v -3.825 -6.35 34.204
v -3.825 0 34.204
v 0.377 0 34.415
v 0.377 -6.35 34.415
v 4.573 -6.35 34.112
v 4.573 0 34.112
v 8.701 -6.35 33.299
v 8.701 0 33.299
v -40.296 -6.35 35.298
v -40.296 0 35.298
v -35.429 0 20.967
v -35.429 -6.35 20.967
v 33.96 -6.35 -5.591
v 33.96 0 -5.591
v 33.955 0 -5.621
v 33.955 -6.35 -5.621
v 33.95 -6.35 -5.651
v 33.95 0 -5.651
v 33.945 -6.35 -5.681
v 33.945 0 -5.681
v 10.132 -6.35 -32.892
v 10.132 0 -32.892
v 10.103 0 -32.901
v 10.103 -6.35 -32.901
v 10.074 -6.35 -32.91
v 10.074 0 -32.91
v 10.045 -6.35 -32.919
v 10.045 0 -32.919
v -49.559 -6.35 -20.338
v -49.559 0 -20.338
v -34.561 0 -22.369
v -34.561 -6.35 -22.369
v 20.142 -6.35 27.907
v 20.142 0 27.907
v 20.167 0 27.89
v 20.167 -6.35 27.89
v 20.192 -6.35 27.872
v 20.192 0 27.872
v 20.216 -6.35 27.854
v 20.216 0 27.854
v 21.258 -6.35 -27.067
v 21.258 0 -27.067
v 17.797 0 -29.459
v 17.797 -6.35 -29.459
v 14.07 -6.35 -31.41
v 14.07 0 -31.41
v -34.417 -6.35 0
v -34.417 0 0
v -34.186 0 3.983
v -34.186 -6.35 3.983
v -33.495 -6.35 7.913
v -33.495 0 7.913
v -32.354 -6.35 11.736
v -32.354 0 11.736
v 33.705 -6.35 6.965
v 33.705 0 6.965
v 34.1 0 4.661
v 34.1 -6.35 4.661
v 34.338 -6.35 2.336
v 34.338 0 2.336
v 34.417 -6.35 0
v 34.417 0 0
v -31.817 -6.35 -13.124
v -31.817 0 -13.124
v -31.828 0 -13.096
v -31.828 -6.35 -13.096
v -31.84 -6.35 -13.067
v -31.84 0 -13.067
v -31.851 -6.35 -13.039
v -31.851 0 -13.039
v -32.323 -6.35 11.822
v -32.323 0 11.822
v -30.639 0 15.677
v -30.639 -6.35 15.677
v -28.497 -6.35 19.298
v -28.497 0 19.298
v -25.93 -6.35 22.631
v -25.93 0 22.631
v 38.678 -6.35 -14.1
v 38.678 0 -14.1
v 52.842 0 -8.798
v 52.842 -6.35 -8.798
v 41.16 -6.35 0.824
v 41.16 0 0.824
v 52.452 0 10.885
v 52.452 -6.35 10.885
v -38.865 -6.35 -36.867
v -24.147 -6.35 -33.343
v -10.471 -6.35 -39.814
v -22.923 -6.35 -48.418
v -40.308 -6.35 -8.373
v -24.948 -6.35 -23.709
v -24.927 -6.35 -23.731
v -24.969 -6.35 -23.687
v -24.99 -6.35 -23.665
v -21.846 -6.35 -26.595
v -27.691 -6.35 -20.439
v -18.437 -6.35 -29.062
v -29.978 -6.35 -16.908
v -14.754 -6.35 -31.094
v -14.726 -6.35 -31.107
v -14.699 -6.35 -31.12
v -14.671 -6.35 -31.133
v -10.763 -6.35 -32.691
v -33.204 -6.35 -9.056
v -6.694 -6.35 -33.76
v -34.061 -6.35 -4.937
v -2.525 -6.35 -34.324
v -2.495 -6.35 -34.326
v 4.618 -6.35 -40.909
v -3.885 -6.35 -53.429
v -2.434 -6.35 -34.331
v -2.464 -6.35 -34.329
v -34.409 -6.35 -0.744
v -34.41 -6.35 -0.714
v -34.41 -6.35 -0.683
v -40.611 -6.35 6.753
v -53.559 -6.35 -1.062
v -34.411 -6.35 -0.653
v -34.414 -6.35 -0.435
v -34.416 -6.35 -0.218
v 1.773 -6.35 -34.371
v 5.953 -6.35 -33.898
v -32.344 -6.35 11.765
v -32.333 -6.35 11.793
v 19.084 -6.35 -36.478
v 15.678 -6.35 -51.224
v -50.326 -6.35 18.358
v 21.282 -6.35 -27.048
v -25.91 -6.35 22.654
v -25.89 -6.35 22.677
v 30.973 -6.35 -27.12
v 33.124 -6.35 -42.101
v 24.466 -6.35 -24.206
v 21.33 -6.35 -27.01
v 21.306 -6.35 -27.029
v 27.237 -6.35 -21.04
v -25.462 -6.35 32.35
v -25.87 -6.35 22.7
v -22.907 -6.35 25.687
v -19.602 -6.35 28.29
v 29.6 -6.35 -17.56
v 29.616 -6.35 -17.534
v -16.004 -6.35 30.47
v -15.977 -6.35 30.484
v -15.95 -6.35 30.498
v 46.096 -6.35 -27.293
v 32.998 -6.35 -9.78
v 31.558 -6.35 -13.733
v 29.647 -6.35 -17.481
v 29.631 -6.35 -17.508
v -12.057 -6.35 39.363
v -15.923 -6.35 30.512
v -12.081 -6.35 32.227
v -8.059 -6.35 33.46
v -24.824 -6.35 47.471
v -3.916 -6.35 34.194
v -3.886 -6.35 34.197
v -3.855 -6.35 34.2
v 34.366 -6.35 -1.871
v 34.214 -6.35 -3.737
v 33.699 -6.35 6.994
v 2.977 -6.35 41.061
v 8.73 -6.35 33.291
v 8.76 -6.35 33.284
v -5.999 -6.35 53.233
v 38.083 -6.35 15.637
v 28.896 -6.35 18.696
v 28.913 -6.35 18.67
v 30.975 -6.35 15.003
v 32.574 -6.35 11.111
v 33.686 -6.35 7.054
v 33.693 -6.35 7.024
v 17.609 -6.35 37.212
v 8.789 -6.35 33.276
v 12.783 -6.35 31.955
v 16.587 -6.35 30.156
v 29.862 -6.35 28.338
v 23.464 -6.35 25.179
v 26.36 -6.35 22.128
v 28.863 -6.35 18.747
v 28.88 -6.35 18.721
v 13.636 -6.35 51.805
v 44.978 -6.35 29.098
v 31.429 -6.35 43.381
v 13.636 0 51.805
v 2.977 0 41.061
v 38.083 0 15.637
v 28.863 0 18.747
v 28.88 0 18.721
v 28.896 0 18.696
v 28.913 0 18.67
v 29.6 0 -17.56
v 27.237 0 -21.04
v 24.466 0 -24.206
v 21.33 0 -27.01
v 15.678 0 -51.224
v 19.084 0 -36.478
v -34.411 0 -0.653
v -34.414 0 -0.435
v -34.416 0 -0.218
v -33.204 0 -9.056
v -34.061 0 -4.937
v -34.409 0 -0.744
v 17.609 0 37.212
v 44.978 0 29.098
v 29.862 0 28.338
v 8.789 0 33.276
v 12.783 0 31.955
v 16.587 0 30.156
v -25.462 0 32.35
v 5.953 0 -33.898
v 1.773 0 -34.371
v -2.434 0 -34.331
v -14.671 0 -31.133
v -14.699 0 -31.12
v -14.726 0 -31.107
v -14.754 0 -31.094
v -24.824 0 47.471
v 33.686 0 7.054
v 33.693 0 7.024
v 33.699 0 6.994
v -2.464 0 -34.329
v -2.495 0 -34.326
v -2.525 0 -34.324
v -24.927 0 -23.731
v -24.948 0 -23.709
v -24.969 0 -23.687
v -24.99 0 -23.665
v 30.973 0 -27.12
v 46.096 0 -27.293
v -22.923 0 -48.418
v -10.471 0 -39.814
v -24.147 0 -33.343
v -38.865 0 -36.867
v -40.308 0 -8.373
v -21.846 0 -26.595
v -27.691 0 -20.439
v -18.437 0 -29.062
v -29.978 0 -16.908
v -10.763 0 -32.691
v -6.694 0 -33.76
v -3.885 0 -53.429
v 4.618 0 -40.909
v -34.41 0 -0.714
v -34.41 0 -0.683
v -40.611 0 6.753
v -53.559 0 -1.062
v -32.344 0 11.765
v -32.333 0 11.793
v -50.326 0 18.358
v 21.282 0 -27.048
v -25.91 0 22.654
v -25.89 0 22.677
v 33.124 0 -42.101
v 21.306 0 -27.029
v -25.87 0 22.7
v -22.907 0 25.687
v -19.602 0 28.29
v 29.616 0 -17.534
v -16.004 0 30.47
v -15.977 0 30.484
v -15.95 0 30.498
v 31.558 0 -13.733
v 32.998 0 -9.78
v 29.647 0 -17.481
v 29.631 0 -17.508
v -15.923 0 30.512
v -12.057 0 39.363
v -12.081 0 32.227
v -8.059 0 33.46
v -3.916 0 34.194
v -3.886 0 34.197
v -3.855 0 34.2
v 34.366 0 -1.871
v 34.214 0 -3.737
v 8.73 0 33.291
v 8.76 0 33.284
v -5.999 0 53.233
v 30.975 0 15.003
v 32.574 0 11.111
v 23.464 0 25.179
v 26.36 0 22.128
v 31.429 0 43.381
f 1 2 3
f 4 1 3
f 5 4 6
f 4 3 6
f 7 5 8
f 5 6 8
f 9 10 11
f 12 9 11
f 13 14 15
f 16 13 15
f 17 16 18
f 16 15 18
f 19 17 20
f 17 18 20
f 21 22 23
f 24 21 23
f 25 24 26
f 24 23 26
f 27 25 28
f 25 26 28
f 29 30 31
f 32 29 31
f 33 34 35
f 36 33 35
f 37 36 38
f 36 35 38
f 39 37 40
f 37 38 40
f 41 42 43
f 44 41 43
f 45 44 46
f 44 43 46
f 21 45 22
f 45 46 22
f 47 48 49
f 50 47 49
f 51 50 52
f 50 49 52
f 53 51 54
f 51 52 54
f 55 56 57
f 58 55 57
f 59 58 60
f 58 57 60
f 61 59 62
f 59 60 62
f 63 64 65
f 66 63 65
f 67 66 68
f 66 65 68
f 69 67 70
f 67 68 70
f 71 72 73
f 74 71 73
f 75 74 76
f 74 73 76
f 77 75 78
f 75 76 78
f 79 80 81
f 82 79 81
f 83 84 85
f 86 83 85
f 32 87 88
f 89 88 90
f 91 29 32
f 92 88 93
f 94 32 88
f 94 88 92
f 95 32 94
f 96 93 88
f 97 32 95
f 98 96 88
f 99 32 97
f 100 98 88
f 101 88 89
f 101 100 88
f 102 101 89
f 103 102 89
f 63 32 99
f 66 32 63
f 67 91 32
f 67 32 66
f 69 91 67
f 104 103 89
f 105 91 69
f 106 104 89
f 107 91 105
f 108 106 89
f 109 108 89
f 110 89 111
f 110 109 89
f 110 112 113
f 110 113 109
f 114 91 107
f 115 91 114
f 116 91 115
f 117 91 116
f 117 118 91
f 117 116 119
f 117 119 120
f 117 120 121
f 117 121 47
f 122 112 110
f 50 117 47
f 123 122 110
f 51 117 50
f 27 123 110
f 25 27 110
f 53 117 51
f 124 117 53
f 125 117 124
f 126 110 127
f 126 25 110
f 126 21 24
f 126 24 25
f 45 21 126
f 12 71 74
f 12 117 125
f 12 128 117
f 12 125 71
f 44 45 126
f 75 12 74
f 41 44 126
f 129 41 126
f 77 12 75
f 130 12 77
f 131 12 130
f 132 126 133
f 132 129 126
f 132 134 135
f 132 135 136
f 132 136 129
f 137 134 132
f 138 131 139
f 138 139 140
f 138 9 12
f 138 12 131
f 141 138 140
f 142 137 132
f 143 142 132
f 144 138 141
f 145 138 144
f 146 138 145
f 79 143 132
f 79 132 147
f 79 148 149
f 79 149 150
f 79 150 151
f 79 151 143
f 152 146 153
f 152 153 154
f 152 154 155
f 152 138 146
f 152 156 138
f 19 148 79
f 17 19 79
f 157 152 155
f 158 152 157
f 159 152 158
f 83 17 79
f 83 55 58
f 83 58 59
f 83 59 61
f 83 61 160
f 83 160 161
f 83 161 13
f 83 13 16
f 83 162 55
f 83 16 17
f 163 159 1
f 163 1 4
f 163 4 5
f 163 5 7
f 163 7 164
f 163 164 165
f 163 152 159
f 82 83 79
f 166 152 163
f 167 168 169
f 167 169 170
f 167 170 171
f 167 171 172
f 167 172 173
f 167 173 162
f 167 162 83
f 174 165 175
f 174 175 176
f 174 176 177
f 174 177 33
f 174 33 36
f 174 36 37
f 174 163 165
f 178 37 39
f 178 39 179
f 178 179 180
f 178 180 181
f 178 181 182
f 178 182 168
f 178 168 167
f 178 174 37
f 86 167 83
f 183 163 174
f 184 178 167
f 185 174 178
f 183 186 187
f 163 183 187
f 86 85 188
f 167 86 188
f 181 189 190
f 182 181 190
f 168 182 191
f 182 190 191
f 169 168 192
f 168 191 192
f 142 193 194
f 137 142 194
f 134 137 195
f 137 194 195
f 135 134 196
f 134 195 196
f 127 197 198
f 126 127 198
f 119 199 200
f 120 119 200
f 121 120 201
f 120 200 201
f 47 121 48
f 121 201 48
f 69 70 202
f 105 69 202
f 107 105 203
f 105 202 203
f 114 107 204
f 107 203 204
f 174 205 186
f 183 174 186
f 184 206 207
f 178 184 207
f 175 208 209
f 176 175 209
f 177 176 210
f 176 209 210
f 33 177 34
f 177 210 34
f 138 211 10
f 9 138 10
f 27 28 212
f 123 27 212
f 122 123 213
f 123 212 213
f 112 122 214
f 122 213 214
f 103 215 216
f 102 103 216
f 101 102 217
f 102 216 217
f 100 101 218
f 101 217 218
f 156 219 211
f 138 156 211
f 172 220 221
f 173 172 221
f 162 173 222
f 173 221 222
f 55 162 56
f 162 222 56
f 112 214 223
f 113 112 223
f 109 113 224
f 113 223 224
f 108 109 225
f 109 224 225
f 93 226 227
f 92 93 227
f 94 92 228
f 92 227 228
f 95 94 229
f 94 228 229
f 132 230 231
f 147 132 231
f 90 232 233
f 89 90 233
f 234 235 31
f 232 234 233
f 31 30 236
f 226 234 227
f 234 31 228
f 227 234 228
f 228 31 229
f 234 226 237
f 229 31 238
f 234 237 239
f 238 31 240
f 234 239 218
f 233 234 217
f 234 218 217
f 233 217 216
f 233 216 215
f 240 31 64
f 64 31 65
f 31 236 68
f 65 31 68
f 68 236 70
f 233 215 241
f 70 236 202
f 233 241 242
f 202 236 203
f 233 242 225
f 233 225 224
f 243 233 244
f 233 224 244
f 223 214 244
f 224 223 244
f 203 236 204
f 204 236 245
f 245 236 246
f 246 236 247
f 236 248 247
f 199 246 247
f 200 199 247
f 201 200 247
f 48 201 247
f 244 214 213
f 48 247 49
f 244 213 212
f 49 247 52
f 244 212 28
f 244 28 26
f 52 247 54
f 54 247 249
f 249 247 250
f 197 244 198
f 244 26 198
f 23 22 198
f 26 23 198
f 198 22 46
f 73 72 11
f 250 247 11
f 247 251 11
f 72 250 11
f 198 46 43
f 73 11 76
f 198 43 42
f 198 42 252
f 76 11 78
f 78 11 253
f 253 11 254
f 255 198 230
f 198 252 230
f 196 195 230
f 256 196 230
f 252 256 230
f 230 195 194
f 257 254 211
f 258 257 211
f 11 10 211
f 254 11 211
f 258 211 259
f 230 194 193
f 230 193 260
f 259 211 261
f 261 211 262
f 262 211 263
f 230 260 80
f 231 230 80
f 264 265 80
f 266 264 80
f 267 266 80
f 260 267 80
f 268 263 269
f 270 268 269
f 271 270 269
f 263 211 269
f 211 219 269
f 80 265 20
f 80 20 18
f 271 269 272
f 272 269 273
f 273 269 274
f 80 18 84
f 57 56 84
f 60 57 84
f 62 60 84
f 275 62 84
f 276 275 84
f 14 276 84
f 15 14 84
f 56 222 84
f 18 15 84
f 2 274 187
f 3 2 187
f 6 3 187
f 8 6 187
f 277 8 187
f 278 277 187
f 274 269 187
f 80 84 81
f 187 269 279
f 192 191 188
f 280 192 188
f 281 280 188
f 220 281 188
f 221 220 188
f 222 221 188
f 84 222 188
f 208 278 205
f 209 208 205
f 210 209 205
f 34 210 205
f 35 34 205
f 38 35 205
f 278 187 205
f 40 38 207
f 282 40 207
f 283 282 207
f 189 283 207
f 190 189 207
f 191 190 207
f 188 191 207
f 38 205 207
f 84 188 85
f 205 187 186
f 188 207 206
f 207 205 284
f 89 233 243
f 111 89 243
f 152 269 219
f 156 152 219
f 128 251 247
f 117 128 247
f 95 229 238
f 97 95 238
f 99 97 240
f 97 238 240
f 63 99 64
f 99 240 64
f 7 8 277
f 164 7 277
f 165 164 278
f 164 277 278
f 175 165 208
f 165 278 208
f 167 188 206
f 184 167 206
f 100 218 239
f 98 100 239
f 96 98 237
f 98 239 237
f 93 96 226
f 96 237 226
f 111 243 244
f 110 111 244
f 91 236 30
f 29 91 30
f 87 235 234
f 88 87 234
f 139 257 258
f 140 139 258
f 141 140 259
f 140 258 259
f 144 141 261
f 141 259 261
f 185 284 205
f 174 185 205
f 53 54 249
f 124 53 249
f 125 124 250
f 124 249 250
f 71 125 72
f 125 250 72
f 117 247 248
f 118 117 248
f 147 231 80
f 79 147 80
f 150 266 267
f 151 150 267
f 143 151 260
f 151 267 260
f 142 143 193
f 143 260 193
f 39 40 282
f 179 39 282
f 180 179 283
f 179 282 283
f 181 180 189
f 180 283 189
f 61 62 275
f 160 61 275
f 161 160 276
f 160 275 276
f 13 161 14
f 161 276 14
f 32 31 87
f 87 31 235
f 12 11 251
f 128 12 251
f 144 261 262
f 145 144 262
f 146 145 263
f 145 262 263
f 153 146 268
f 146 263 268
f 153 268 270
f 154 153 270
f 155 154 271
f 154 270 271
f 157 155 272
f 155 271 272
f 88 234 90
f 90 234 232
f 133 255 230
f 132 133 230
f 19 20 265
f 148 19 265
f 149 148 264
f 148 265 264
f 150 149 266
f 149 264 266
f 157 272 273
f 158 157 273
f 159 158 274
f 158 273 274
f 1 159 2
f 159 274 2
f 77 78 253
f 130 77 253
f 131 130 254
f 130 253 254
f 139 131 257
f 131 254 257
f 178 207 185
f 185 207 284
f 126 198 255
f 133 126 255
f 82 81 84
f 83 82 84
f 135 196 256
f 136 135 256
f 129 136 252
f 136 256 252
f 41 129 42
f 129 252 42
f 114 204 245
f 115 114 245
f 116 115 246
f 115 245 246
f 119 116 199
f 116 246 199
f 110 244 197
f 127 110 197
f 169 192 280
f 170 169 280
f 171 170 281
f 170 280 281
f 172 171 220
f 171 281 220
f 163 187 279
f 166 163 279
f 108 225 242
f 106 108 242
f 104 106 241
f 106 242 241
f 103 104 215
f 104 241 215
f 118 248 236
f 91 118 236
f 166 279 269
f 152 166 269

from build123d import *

# Parameters (mm, degrees)
F1_DEPTH = 6.35


with BuildPart() as f1:
    # F0 (on Front) → F1 (new body)
    with BuildSketch(Plane.XZ):
        with BuildLine():
            ThreePointArc((33.7049633841, 6.9645769632), (34.2385281064, 3.500440273), (34.417, 0))
            ThreePointArc((34.417, 0), (34.302515046, -2.8048797692), (33.9598218311, -5.5910991943))
            Line((33.9598218311, -5.5910991943), (41.1601353323, 0.8241980434))
            Line((41.1601353323, 0.8241980434), (33.7049633841, 6.9645769632))
        make_face()
        with BuildLine():
            ThreePointArc((33.6863287618, 7.0541578911), (33.6956758421, 7.0093736198), (33.7049633841, 6.9645769632))
            Line((33.7049633841, 6.9645769632), (41.1601353323, 0.8241980434))
            Line((41.1601353323, 0.8241980434), (52.4522360603, 10.8851742211))
            Line((52.4522360603, 10.8851742211), (38.0829484815, 15.6372976549))
            Line((38.0829484815, 15.6372976549), (33.6863287618, 7.0541578911))
        make_face()
        with BuildLine():
            Line((41.1601353323, 0.8241980434), (33.9598218311, -5.5910991943))
            ThreePointArc((33.9598218311, -5.5910991943), (33.9523597791, -5.6362358386), (33.9448377352, -5.6813625239))
            Line((33.9448377352, -5.6813625239), (38.6784178304, -14.1002140809))
            Line((38.6784178304, -14.1002140809), (52.8424319687, -8.7978104763))
            Line((52.8424319687, -8.7978104763), (41.1601353323, 0.8241980434))
        make_face()
        with BuildLine():
            ThreePointArc((28.9130469623, 18.6699117394), (31.8339739057, 13.0815899024), (33.6863287618, 7.0541578911))
            Line((33.6863287618, 7.0541578911), (38.0829484815, 15.6372976549))
            Line((38.0829484815, 15.6372976549), (28.9130469623, 18.6699117394))
        make_face()
        with BuildLine():
            Line((38.6784178304, -14.1002140809), (33.9448377352, -5.6813625239))
            ThreePointArc((33.9448377352, -5.6813625239), (32.338600716, -11.7789979509), (29.6468527842, -17.4812473522))
            Line((29.6468527842, -17.4812473522), (38.6784178304, -14.1002140809))
        make_face()
        with BuildLine():
            ThreePointArc((28.8633103308, 18.746711865), (28.8882041685, 18.7083283305), (28.9130469623, 18.6699117394))
            Line((28.9130469623, 18.6699117394), (38.0829484815, 15.6372976549))
            Line((38.0829484815, 15.6372976549), (44.978075024, 29.098055823))
            Line((44.978075024, 29.098055823), (29.8624484133, 28.3384935689))
            Line((29.8624484133, 28.3384935689), (28.8633103308, 18.746711865))
        make_face()
        with BuildLine():
            Line((38.6784178304, -14.1002140809), (29.6468527842, -17.4812473522))
            ThreePointArc((29.6468527842, -17.4812473522), (29.6235893914, -17.5206404154), (29.6002736554, -17.5600025206))
            Line((29.6002736554, -17.5600025206), (30.9729656759, -27.1203141617))
            Line((30.9729656759, -27.1203141617), (46.0959646298, -27.2926021184))
            Line((46.0959646298, -27.2926021184), (38.6784178304, -14.1002140809))
        make_face()
        with BuildLine():
            ThreePointArc((20.2162633355, 27.8537714816), (24.9586812859, 23.6979770755), (28.8633103308, 18.746711865))
            Line((28.8633103308, 18.746711865), (29.8624484133, 28.3384935689))
            Line((29.8624484133, 28.3384935689), (20.2162633355, 27.8537714816))
        make_face()
        with BuildLine():
            Line((30.9729656759, -27.1203141617), (29.6002736554, -17.5600025206))
            ThreePointArc((29.6002736554, -17.5600025206), (25.8997822597, -22.6656384843), (21.32991199, -27.0104561883))
            Line((21.32991199, -27.0104561883), (30.9729656759, -27.1203141617))
        make_face()
        with BuildLine():
            ThreePointArc((20.1421419025, 27.9074185223), (20.1792204468, 27.8806196337), (20.2162633355, 27.8537714816))
            Line((20.2162633355, 27.8537714816), (29.8624484133, 28.3384935689))
            Line((29.8624484133, 28.3384935689), (31.4293757236, 43.3810837482))
            Line((31.4293757236, 43.3810837482), (17.6088592133, 37.2124188974))
            Line((17.6088592133, 37.2124188974), (20.1421419025, 27.9074185223))
        make_face()
        with BuildLine():
            Line((30.9729656759, -27.1203141617), (21.32991199, -27.0104561883))
            ThreePointArc((21.32991199, -27.0104561883), (21.2939891065, -27.038785419), (21.2580285976, -27.0670668736))
            Line((21.2580285976, -27.0670668736), (19.0844428798, -36.477665536))
            Line((19.0844428798, -36.477665536), (33.123981841, -42.101376611))
            Line((33.123981841, -42.101376611), (30.9729656759, -27.1203141617))
        make_face()
        with BuildLine():
            ThreePointArc((-34.4108099912, -0.6527210357), (-34.415452463, -0.3263751931), (-34.417, 0))
            ThreePointArc((-34.417, 0), (-33.8973849094, 5.9579514354), (-32.354229549, 11.7360009923))
            Line((-32.354229549, 11.7360009923), (-40.6107518041, 6.7529905151))
            Line((-40.6107518041, 6.7529905151), (-34.4108099912, -0.6527210357))
        make_face()
        with BuildLine():
            ThreePointArc((8.789161323, 33.2758250422), (14.7125804577, 31.1138211295), (20.1421419025, 27.9074185223))
            Line((20.1421419025, 27.9074185223), (17.6088592133, 37.2124188974))
            Line((17.6088592133, 37.2124188974), (8.789161323, 33.2758250422))
        make_face()
        with BuildLine():
            Line((19.0844428798, -36.477665536), (21.2580285976, -27.0670668736))
            ThreePointArc((21.2580285976, -27.0670668736), (15.9630546935, -30.4911589457), (10.1322483884, -32.891753246))
            Line((10.1322483884, -32.891753246), (19.0844428798, -36.477665536))
        make_face()
        with BuildLine():
            Line((-40.6107518041, 6.7529905151), (-32.354229549, 11.7360009923))
            ThreePointArc((-32.354229549, 11.7360009923), (-32.338600716, 11.7789979509), (-32.3229147426, 11.8219740967))
            Line((-32.3229147426, 11.8219740967), (-35.4289367271, 20.9672717676))
            Line((-35.4289367271, 20.9672717676), (-50.3260957143, 18.3577824288))
            Line((-50.3260957143, 18.3577824288), (-40.6107518041, 6.7529905151))
        make_face()
        with BuildLine():
            ThreePointArc((-34.408953111, -0.7442007809), (-34.4099119513, -0.6984615254), (-34.4108099912, -0.6527210357))
            Line((-34.4108099912, -0.6527210357), (-40.6107518041, 6.7529905151))
            Line((-40.6107518041, 6.7529905151), (-53.55928258, -1.0617603602))
            Line((-53.55928258, -1.0617603602), (-40.307859818, -8.373319526))
            Line((-40.307859818, -8.373319526), (-34.408953111, -0.7442007809))
        make_face()
        with BuildLine():
            ThreePointArc((8.7006655989, 33.2990736679), (8.7449211868, 33.2874787636), (8.789161323, 33.2758250422))
            Line((8.789161323, 33.2758250422), (17.6088592133, 37.2124188974))
            Line((17.6088592133, 37.2124188974), (13.6359650756, 51.8052559303))
            Line((13.6359650756, 51.8052559303), (2.9770960026, 41.0606008527))
            Line((2.9770960026, 41.0606008527), (8.7006655989, 33.2990736678))
        make_face()
        with BuildLine():
            Line((19.0844428798, -36.477665536), (10.1322483884, -32.891753246))
            ThreePointArc((10.1322483884, -32.891753246), (10.0885175986, -32.9051926246), (10.0447689829, -32.9185738616))
            Line((10.0447689829, -32.9185738616), (4.6184603222, -40.90850605))
            Line((4.6184603222, -40.90850605), (15.6784217583, -51.2241269004))
            Line((15.6784217583, -51.2241269004), (19.0844428798, -36.477665536))
        make_face()
        with BuildLine():
            Line((-35.4289367271, 20.9672717676), (-32.3229147426, 11.8219740967))
            ThreePointArc((-32.3229147426, 11.8219740967), (-29.6235893914, 17.5206404154), (-25.9298880054, 22.6311908))
            Line((-25.9298880054, 22.6311908), (-35.4289367271, 20.9672717676))
        make_face()
        with BuildLine():
            ThreePointArc((-31.8513346736, -13.0392625754), (-33.6956758421, -7.0093736198), (-34.408953111, -0.7442007809))
            Line((-34.408953111, -0.7442007809), (-40.307859818, -8.373319526))
            Line((-40.307859818, -8.373319526), (-31.8513346736, -13.0392625754))
        make_face()
        with BuildLine():
            ThreePointArc((-3.8249656285, 34.2037940431), (2.4794641134, 34.3275712323), (8.7006655989, 33.2990736679))
            Line((8.7006655989, 33.2990736678), (2.9770960026, 41.0606008527))
            Line((2.9770960026, 41.0606008527), (-3.8249656285, 34.2037940431))
        make_face()
        with BuildLine():
            Line((4.6184603222, -40.90850605), (10.0447689829, -32.9185738616))
            ThreePointArc((10.0447689829, -32.9185738616), (3.8704281367, -34.1986794341), (-2.4338315028, -34.3308367684))
            Line((-2.4338315028, -34.3308367684), (4.6184603222, -40.90850605))
        make_face()
        with BuildLine():
            ThreePointArc((-31.8165568888, -13.1238941149), (-31.8339739057, -13.0815899024), (-31.8513346736, -13.0392625754))
            Line((-31.8513346736, -13.0392625754), (-40.307859818, -8.373319526))
            Line((-40.307859818, -8.373319526), (-49.558991551, -20.3379065292))
            Line((-49.558991551, -20.3379065292), (-34.5611680099, -22.368766367))
            Line((-34.5611680099, -22.368766367), (-31.8165568888, -13.1238941149))
        make_face()
        with BuildLine():
            ThreePointArc((-24.990160114, -23.6647794512), (-28.8882041685, -18.7083283305), (-31.8165568888, -13.1238941149))
            Line((-31.8165568888, -13.1238941149), (-34.5611680099, -22.368766367))
            Line((-34.5611680099, -22.368766367), (-24.990160114, -23.6647794512))
        make_face()
        with BuildLine():
            Line((-35.4289367271, 20.9672717676), (-25.9298880054, 22.6311908))
            ThreePointArc((-25.9298880054, 22.6311908), (-25.8997822597, 22.6656384843), (-25.8696307505, 22.7000461196))
            Line((-25.8696307505, 22.7000461196), (-25.4622474266, 32.3498067842))
            Line((-25.4622474266, 32.3498067842), (-40.2960907558, 35.2980049768))
            Line((-40.2960907558, 35.2980049768), (-35.4289367271, 20.9672717676))
        make_face()
        with BuildLine():
            ThreePointArc((-3.915883806, 34.193504398), (-3.8704281367, 34.1986794341), (-3.8249656285, 34.2037940431))
            Line((-3.8249656285, 34.2037940431), (2.9770960026, 41.0606008527))
            Line((2.9770960026, 41.0606008527), (-5.9990582154, 53.2328412361))
            Line((-5.9990582154, 53.2328412361), (-12.05674052, 39.3633211381))
            Line((-12.05674052, 39.3633211381), (-3.915883806, 34.193504398))
        make_face()
        with BuildLine():
            Line((4.6184603222, -40.90850605), (-2.4338315028, -34.3308367684))
            ThreePointArc((-2.4338315028, -34.3308367684), (-2.4794641134, -34.3275712323), (-2.5250923429, -34.3242450414))
            Line((-2.5250923429, -34.3242450414), (-10.4712708936, -39.8144261401))
            Line((-10.4712708936, -39.8144261401), (-3.88459606, -53.4287750093))
            Line((-3.88459606, -53.4287750093), (4.6184603222, -40.90850605))
        make_face()
        with BuildLine():
            Line((-25.4622474266, 32.3498067842), (-25.8696307505, 22.7000461196))
            ThreePointArc((-25.8696307505, 22.7000461196), (-21.2939891065, 27.038785419), (-16.0035714042, 30.4699128865))
            Line((-16.0035714042, 30.4699128865), (-25.4622474266, 32.3498067842))
        make_face()
        with BuildLine():
            ThreePointArc((-24.9271583572, -23.7311328267), (-24.9586812859, -23.6979770755), (-24.990160114, -23.6647794512))
            Line((-24.990160114, -23.6647794512), (-34.5611680099, -22.368766367))
            Line((-34.5611680099, -22.368766367), (-38.8654840973, -36.8673057251))
            Line((-38.8654840973, -36.8673057251), (-24.146798952, -33.3431873606))
            Line((-24.146798952, -33.3431873606), (-24.9271583572, -23.7311328267))
        make_face()
        with BuildLine():
            ThreePointArc((-14.7539259558, -31.0942367311), (-20.1792204468, -27.8806196337), (-24.9271583572, -23.7311328267))
            Line((-24.9271583572, -23.7311328267), (-24.146798952, -33.3431873606))
            Line((-24.146798952, -33.3431873606), (-14.7539259558, -31.0942367311))
        make_face()
        with BuildLine():
            ThreePointArc((-15.922509777, 30.5123511287), (-10.0885175986, 32.9051926246), (-3.915883806, 34.193504398))
            Line((-3.915883806, 34.193504398), (-12.05674052, 39.3633211381))
            Line((-12.05674052, 39.3633211381), (-15.922509777, 30.5123511287))
        make_face()
        with BuildLine():
            Line((-10.4712708936, -39.8144261401), (-2.5250923429, -34.3242450414))
            ThreePointArc((-2.5250923429, -34.3242450414), (-8.7449211868, -33.2874787636), (-14.6712089632, -31.1333505514))
            Line((-14.6712089632, -31.1333505514), (-10.4712708936, -39.8144261401))
        make_face()
        with BuildLine():
            Line((-25.4622474266, 32.3498067842), (-16.0035714042, 30.4699128865))
            ThreePointArc((-16.0035714042, 30.4699128865), (-15.9630546935, 30.4911589457), (-15.922509777, 30.5123511287))
            Line((-15.922509777, 30.5123511287), (-12.05674052, 39.3633211381))
            Line((-12.05674052, 39.3633211381), (-24.8238754524, 47.4710363597))
            Line((-24.8238754524, 47.4710363597), (-25.4622474266, 32.3498067842))
        make_face()
        with BuildLine():
            ThreePointArc((-14.6712089632, -31.1333505514), (-14.7125804577, -31.1138211295), (-14.7539259558, -31.0942367311))
            Line((-14.7539259558, -31.0942367311), (-24.146798952, -33.3431873606))
            Line((-24.146798952, -33.3431873606), (-22.9229776551, -48.4175709941))
            Line((-22.9229776551, -48.4175709941), (-10.4712708936, -39.8144261401))
            Line((-10.4712708936, -39.8144261401), (-14.6712089632, -31.1333505514))
        make_face()
    extrude(amount=F1_DEPTH)


solid = f1.part
